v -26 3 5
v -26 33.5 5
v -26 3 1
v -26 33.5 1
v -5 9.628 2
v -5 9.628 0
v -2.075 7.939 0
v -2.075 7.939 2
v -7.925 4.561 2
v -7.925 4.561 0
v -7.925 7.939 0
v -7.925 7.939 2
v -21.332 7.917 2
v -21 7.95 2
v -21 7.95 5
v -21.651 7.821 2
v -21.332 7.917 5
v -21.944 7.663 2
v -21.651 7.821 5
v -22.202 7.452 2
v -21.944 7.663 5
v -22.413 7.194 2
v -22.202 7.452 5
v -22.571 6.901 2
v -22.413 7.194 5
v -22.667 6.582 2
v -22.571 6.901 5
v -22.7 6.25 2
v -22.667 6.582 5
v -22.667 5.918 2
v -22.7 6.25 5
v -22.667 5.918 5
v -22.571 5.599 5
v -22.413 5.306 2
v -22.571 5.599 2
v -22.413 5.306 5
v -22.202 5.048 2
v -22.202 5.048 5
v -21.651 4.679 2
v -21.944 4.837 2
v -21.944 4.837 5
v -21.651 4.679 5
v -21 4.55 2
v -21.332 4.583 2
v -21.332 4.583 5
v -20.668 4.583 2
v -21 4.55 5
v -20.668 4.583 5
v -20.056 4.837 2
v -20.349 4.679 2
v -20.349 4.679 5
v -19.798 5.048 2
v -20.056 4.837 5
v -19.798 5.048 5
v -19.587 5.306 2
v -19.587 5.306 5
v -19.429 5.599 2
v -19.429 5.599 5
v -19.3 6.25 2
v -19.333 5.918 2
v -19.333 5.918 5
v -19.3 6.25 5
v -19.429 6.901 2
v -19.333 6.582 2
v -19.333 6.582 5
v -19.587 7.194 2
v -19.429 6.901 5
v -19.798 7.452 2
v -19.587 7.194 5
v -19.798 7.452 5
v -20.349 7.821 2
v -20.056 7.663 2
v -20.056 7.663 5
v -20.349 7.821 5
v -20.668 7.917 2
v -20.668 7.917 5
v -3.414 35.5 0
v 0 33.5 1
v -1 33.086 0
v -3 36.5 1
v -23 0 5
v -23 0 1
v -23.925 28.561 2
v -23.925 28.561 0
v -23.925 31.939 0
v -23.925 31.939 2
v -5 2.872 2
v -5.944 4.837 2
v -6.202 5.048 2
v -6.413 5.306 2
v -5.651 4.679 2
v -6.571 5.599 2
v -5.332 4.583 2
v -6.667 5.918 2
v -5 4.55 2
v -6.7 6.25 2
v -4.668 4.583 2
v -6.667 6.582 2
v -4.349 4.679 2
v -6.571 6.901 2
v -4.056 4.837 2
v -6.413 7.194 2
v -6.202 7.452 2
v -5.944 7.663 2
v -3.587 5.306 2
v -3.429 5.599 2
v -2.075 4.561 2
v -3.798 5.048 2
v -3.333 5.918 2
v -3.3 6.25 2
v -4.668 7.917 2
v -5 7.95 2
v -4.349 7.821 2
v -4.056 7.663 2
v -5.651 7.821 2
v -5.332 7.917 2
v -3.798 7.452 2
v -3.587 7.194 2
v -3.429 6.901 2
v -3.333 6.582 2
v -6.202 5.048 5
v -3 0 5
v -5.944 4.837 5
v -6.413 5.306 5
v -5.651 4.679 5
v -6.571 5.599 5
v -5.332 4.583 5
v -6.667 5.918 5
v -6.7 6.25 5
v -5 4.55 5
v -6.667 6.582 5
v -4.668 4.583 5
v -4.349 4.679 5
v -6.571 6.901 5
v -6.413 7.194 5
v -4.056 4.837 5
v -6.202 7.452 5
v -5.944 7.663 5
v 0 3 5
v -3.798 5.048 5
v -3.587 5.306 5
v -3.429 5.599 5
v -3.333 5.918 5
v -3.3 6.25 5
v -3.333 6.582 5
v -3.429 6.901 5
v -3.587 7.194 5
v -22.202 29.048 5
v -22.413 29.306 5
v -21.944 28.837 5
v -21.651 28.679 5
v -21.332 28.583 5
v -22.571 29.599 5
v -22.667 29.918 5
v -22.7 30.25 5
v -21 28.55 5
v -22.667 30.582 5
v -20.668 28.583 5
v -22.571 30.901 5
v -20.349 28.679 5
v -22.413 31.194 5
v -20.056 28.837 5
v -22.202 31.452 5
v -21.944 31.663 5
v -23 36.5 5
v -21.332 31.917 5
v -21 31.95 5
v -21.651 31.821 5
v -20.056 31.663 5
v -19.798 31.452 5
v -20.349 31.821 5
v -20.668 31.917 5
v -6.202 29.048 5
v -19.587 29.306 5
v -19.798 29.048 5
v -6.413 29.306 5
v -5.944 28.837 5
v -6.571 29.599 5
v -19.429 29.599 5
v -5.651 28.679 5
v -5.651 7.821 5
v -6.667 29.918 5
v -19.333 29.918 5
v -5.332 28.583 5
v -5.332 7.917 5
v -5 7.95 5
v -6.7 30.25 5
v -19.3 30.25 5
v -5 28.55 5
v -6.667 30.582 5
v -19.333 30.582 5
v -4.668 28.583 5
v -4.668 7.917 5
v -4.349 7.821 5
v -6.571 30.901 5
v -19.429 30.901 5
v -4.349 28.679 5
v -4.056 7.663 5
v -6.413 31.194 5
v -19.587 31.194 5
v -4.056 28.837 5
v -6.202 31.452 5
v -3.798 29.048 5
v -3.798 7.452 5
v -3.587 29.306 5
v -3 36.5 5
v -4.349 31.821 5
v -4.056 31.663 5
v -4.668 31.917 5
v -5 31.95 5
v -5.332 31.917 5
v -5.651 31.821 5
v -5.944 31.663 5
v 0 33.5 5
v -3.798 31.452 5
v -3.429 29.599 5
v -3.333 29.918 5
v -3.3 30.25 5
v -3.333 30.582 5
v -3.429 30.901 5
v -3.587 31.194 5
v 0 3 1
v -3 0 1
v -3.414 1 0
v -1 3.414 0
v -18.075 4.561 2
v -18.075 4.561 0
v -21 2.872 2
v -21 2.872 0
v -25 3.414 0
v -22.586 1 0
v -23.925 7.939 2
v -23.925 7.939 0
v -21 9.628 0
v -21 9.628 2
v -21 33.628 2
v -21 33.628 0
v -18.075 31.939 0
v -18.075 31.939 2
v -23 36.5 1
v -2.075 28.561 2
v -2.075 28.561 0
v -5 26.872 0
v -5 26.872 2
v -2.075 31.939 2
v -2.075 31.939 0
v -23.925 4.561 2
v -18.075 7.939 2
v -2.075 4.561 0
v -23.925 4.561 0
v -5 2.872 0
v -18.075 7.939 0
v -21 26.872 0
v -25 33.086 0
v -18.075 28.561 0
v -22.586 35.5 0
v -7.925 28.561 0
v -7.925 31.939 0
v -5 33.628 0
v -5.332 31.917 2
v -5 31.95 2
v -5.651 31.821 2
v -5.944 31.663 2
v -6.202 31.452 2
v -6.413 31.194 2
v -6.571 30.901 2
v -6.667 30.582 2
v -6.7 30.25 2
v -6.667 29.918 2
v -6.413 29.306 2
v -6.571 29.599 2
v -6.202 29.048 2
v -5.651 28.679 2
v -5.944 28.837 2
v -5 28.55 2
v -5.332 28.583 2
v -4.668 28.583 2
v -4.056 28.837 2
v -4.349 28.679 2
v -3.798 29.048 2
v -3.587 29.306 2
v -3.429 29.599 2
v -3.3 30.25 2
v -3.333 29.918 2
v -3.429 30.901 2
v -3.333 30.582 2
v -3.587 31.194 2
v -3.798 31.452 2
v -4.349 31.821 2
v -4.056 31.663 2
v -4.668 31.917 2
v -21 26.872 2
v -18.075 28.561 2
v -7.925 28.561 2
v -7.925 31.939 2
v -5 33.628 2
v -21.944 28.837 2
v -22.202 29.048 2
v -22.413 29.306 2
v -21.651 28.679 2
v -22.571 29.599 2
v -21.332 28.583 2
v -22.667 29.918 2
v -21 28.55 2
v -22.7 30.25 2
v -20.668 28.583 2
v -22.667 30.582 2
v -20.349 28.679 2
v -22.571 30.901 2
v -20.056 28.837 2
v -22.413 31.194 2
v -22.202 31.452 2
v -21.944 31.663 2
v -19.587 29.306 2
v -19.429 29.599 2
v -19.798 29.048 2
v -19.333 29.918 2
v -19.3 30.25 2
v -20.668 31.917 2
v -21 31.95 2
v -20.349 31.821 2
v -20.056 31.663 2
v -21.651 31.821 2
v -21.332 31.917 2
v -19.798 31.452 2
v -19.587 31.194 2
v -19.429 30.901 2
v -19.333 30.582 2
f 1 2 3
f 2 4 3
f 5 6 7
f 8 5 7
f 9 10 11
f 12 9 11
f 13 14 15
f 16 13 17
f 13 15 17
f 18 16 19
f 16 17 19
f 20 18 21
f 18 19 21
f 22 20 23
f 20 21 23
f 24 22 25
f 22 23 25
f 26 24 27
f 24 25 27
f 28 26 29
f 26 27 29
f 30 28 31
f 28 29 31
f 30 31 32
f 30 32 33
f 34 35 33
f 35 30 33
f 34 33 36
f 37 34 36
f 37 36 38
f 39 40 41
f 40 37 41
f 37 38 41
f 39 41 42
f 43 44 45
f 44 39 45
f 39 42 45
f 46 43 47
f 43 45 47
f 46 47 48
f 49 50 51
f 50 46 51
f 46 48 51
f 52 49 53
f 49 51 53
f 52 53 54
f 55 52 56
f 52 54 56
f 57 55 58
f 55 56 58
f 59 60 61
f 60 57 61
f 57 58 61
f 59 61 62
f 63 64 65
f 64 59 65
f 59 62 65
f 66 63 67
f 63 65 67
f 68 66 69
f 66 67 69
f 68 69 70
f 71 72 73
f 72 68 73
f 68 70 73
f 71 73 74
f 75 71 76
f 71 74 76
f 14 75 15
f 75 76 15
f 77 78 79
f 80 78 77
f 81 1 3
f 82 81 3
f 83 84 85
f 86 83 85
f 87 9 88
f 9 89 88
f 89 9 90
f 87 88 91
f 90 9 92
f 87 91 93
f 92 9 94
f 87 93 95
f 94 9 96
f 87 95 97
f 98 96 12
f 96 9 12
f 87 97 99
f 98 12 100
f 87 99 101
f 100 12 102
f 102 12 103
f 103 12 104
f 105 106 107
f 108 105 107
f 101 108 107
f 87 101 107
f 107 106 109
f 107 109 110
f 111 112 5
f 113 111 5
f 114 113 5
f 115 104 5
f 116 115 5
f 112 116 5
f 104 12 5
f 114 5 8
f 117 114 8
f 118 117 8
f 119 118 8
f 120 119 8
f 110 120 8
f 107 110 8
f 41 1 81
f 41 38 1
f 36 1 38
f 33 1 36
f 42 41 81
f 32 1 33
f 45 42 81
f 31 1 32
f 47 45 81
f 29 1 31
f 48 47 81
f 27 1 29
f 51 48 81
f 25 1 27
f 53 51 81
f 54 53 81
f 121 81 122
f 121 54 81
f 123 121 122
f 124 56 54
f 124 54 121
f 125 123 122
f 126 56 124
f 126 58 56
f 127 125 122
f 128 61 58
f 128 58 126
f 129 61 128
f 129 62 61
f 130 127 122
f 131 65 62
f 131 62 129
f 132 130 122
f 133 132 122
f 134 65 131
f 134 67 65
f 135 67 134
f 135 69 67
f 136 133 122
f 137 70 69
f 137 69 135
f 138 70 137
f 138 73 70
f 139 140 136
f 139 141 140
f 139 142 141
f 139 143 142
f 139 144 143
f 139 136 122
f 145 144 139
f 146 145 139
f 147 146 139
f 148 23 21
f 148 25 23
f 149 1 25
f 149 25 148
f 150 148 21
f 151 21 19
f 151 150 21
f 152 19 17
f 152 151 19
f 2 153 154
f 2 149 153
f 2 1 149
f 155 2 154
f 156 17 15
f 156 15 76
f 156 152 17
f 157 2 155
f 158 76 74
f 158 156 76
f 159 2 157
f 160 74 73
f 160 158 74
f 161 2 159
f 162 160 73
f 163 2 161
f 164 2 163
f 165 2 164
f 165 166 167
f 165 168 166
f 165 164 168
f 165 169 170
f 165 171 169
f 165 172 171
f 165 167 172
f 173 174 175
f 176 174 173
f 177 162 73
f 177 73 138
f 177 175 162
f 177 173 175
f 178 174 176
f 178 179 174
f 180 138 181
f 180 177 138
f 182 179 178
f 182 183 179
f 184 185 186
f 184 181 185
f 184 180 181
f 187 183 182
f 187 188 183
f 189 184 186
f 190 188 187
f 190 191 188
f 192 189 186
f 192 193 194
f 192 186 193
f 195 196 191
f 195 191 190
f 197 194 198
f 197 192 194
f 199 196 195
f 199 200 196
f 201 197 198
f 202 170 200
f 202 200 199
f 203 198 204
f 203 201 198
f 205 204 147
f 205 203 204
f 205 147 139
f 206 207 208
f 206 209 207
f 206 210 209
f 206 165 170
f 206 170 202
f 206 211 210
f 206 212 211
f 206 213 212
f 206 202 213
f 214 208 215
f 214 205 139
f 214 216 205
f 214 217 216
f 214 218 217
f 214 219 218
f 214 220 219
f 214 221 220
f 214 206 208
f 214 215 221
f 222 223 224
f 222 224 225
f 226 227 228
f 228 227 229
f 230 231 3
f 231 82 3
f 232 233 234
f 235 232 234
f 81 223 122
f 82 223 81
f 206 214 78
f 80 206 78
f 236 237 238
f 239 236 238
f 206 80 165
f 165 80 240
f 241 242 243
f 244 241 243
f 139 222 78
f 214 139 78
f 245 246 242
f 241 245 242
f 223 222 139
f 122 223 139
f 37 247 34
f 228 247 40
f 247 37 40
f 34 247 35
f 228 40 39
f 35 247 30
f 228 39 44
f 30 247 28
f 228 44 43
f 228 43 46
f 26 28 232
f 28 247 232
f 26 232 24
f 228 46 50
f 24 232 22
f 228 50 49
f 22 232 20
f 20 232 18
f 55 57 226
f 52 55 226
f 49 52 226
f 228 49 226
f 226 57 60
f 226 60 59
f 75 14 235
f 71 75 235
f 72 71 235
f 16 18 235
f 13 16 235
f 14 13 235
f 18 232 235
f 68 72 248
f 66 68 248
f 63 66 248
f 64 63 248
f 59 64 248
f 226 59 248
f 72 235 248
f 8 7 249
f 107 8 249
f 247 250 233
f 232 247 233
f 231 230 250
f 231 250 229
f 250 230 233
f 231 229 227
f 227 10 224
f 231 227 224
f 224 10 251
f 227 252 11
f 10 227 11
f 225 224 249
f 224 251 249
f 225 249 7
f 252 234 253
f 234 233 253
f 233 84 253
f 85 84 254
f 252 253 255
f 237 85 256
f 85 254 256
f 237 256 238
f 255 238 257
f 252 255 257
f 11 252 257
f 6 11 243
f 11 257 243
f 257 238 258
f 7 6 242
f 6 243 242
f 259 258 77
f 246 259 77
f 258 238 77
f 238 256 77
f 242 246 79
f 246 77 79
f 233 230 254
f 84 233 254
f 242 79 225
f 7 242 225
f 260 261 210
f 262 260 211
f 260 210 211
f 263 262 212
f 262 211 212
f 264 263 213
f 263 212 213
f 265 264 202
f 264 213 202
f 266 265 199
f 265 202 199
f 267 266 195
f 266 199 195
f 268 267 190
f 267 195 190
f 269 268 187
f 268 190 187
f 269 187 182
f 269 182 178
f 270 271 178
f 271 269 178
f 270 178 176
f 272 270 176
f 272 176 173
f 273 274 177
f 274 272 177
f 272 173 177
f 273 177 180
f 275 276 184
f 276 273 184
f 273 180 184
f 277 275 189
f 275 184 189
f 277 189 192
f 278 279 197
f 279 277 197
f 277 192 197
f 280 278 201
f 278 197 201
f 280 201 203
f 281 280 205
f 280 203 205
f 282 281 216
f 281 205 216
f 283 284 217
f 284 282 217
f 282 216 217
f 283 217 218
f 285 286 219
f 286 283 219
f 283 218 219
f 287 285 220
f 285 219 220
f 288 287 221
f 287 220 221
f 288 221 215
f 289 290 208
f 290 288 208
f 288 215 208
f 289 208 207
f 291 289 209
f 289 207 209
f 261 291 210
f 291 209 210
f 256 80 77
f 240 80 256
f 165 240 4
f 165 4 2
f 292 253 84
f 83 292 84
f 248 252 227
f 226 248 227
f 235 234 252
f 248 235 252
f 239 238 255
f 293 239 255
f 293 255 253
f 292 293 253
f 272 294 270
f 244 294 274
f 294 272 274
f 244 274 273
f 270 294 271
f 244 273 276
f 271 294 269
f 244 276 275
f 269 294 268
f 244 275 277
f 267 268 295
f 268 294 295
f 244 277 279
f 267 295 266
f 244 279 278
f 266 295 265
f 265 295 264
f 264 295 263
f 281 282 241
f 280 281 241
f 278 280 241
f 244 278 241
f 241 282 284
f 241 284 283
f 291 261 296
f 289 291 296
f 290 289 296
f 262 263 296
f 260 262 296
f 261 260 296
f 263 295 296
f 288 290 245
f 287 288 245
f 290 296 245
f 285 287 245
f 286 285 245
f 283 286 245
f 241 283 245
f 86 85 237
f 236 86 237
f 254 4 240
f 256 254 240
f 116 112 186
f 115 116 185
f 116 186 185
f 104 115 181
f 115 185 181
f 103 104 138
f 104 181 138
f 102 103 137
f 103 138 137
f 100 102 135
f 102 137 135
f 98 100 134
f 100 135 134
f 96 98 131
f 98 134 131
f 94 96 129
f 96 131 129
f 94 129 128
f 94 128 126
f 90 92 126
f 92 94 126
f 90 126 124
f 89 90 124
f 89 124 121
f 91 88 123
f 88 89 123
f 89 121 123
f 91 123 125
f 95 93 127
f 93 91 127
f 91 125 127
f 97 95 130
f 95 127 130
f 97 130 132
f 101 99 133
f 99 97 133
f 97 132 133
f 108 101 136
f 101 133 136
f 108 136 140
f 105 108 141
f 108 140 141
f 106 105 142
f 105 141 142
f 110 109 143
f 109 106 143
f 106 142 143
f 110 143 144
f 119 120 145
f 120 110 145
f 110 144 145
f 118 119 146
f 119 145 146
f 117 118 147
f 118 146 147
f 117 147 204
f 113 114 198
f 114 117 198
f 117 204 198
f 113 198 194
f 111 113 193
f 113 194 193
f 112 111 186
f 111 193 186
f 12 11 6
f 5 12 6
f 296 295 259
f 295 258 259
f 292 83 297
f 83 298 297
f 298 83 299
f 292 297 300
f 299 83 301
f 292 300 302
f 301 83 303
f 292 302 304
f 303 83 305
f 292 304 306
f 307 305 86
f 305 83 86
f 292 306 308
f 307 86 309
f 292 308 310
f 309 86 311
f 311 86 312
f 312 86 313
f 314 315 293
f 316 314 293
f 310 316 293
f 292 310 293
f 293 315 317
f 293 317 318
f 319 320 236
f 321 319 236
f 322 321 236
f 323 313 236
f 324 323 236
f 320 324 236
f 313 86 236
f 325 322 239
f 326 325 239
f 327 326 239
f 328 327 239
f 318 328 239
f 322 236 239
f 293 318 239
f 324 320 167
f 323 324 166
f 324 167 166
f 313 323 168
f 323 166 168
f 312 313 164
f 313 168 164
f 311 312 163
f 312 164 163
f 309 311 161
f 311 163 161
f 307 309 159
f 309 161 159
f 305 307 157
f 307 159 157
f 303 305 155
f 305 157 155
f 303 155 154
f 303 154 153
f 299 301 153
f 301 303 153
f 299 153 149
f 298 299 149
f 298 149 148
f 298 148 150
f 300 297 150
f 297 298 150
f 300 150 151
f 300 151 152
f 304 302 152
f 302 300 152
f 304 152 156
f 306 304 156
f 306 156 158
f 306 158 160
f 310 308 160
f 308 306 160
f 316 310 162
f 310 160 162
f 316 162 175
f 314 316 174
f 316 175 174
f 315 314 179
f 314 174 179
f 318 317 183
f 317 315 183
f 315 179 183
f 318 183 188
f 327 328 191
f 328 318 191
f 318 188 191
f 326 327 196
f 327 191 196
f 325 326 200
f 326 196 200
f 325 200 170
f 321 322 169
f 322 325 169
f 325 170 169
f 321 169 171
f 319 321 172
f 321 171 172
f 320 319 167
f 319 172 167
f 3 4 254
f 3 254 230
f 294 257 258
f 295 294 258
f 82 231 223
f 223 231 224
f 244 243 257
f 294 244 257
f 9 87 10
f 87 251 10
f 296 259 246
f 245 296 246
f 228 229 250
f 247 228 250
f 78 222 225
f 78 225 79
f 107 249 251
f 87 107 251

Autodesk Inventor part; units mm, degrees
ref_plane "YZ Plane" through (0, 0, 0) normal (1, 0, 0) x (0, 1, 0)
ref_plane "XZ Plane" through (0, 0, 0) normal (0, 1, 0) x (-1, 0, 0)
ref_plane "XY Plane" through (0, 0, 0) normal (0, 0, 1) x (1, 0, 0)
sketch "Sketch1" plane through (0, 0, 0) normal (0, 0, 1) x (1, 0, 0)
  line L0 (0, 0) -> (-26, 0)
  line L1 (0, 0) -> (0, 36.5)
  line L2 (0, 36.5) -> (-26, 36.5)
  line L3 (-26, 36.5) -> (-26, 0)
  dimension "d0" = 26
  dimension "d1" = 36.5
sketch "Sketch2" plane through (0, 0, 0) normal (0, 0, 1) x (1, 0, 0)
  line L0 (-13, 0) -> (-13, 6.25)
  circle A0 centre (-21, 30.25) radius 1.7
  circle A1 centre (-21, 6.25) radius 1.7
  circle A2 centre (-5, 30.25) radius 1.7
  circle A3 centre (-5, 6.25) radius 1.7
  line L1 (-13, 6.25) -> (-5, 6.25)
  line L2 (-13, 6.25) -> (-21, 6.25)
  line L3 (-21, 30.25) -> (-5, 30.25)
  line L4 (-5, 30.25) -> (-5, 6.25)
  line L5 (-21, 18.25) -> (-13, 18.25)
  line L6 (-13, 18.25) -> (-13, 6.25)
  line L7 (-21, 6.25) -> (-21, 18.25)
  line L8 (-21, 18.25) -> (-21, 30.25)
  line L9 (0, 0) -> (-13, 0)
  line L10 (-18.075, 4.5613) -> (-21, 2.8725)
  line L11 (-21, 2.8725) -> (-23.925, 4.5613)
  line L12 (-23.925, 4.5613) -> (-23.925, 7.9387)
  line L13 (-23.925, 7.9387) -> (-21, 9.6275)
  line L14 (-21, 9.6275) -> (-18.075, 7.9387)
  line L15 (-18.075, 7.9387) -> (-18.075, 4.5613)
  line L16 (-7.925, 7.9387) -> (-5, 9.6275)
  line L17 (-5, 9.6275) -> (-2.075, 7.9387)
  line L18 (-2.075, 7.9387) -> (-2.075, 4.5613)
  line L19 (-2.075, 4.5613) -> (-5, 2.8725)
  line L20 (-5, 2.8725) -> (-7.925, 4.5613)
  line L21 (-7.925, 4.5613) -> (-7.925, 7.9387)
  line L22 (-7.925, 31.9387) -> (-5, 33.6275)
  line L23 (-5, 33.6275) -> (-2.075, 31.9387)
  line L24 (-2.075, 31.9387) -> (-2.075, 28.5613)
  line L25 (-2.075, 28.5613) -> (-5, 26.8725)
  line L26 (-5, 26.8725) -> (-7.925, 28.5613)
  line L27 (-7.925, 28.5613) -> (-7.925, 31.9387)
  line L28 (-18.075, 28.5613) -> (-21, 26.8725)
  line L29 (-21, 26.8725) -> (-23.925, 28.5613)
  line L30 (-23.925, 28.5613) -> (-23.925, 31.9387)
  line L31 (-23.925, 31.9387) -> (-21, 33.6275)
  line L32 (-21, 33.6275) -> (-18.075, 31.9387)
  line L33 (-18.075, 31.9387) -> (-18.075, 28.5613)
  point P0 (8.2274, 51.4671)
  point P1 (-18.075, 6.25)
  point P2 (-7.925, 6.25)
  point P3 (-7.925, 30.25)
  point P4 (-18.075, 30.25)
  dimension "d2" = 3.4
  dimension "d3" = 3.4
  dimension "d4" = 3.4
  dimension "d5" = 3.4
  dimension "d7" = 8
  dimension "d8" = 8
  dimension "d9" = 12
  dimension "d10" = 12
  dimension "d12" = 18.25
  dimension "d13" = 13
  dimension "d34" = 5.85
  dimension "d35" = 5.85
  dimension "d36" = 5.85
  dimension "d37" = 5.85
extrude "Extrusion1" add sketch "Sketch1" along normal blind 5
hole "Hole1" at (8.2274, 51.4671, 0) at (-5, 30.25, 0) at (-21, 30.25, 0) at (-21, 6.25, 0) at (-5, 6.25, 0) direction (0, 0, 1) diameter 3.4 end through all
chamfer "Chamfer1" distance 3 angle 45 4 edges at (0, 0, 2.5) (-26, 0, 2.5) (-26, 36.5, 2.5) (0, 36.5, 2.5)
extrude "Extrusion3" cut sketch "Sketch2" along normal blind 2 contours L3 L33 L28 L8 A0 | A0 L8 L29 L30 L31 L32 L33 L3 | L27 L22 L23 L24 L25 L4 A2 L3 | L3 A2 L4 L26 L27 | L14 L15 L2 A1 L7 | L7 A1 L2 L15 L10 L11 L12 L13 | L17 L18 L19 L20 L21 L1 A3 L4 | L4 A3 L1 L21 L16
chamfer "Chamfer2" distance 1 angle 45 8 edges at (-1.5, 1.5, 0) (-13, 0, 0) (-24.5, 1.5, 0) (-26, 18.25, 0) (-13, 36.5, 0) (-1.5, 35, 0) (-24.5, 35, 0) (0, 18.25, 0)
equation "\"d3\" = d2"
equation "\"d4\" = d2"
equation "\"d5\" = d2"
equation "\"d8\" = d7"
equation "\"d9\" = d10"
equation "\"d13\" = 0.5 * d0"
equation "\"d35\" = d34"
equation "\"d36\" = d34"
equation "\"d37\" = d34"
equation "\"d16\" = d2"
properties part number "camera_adapter"
